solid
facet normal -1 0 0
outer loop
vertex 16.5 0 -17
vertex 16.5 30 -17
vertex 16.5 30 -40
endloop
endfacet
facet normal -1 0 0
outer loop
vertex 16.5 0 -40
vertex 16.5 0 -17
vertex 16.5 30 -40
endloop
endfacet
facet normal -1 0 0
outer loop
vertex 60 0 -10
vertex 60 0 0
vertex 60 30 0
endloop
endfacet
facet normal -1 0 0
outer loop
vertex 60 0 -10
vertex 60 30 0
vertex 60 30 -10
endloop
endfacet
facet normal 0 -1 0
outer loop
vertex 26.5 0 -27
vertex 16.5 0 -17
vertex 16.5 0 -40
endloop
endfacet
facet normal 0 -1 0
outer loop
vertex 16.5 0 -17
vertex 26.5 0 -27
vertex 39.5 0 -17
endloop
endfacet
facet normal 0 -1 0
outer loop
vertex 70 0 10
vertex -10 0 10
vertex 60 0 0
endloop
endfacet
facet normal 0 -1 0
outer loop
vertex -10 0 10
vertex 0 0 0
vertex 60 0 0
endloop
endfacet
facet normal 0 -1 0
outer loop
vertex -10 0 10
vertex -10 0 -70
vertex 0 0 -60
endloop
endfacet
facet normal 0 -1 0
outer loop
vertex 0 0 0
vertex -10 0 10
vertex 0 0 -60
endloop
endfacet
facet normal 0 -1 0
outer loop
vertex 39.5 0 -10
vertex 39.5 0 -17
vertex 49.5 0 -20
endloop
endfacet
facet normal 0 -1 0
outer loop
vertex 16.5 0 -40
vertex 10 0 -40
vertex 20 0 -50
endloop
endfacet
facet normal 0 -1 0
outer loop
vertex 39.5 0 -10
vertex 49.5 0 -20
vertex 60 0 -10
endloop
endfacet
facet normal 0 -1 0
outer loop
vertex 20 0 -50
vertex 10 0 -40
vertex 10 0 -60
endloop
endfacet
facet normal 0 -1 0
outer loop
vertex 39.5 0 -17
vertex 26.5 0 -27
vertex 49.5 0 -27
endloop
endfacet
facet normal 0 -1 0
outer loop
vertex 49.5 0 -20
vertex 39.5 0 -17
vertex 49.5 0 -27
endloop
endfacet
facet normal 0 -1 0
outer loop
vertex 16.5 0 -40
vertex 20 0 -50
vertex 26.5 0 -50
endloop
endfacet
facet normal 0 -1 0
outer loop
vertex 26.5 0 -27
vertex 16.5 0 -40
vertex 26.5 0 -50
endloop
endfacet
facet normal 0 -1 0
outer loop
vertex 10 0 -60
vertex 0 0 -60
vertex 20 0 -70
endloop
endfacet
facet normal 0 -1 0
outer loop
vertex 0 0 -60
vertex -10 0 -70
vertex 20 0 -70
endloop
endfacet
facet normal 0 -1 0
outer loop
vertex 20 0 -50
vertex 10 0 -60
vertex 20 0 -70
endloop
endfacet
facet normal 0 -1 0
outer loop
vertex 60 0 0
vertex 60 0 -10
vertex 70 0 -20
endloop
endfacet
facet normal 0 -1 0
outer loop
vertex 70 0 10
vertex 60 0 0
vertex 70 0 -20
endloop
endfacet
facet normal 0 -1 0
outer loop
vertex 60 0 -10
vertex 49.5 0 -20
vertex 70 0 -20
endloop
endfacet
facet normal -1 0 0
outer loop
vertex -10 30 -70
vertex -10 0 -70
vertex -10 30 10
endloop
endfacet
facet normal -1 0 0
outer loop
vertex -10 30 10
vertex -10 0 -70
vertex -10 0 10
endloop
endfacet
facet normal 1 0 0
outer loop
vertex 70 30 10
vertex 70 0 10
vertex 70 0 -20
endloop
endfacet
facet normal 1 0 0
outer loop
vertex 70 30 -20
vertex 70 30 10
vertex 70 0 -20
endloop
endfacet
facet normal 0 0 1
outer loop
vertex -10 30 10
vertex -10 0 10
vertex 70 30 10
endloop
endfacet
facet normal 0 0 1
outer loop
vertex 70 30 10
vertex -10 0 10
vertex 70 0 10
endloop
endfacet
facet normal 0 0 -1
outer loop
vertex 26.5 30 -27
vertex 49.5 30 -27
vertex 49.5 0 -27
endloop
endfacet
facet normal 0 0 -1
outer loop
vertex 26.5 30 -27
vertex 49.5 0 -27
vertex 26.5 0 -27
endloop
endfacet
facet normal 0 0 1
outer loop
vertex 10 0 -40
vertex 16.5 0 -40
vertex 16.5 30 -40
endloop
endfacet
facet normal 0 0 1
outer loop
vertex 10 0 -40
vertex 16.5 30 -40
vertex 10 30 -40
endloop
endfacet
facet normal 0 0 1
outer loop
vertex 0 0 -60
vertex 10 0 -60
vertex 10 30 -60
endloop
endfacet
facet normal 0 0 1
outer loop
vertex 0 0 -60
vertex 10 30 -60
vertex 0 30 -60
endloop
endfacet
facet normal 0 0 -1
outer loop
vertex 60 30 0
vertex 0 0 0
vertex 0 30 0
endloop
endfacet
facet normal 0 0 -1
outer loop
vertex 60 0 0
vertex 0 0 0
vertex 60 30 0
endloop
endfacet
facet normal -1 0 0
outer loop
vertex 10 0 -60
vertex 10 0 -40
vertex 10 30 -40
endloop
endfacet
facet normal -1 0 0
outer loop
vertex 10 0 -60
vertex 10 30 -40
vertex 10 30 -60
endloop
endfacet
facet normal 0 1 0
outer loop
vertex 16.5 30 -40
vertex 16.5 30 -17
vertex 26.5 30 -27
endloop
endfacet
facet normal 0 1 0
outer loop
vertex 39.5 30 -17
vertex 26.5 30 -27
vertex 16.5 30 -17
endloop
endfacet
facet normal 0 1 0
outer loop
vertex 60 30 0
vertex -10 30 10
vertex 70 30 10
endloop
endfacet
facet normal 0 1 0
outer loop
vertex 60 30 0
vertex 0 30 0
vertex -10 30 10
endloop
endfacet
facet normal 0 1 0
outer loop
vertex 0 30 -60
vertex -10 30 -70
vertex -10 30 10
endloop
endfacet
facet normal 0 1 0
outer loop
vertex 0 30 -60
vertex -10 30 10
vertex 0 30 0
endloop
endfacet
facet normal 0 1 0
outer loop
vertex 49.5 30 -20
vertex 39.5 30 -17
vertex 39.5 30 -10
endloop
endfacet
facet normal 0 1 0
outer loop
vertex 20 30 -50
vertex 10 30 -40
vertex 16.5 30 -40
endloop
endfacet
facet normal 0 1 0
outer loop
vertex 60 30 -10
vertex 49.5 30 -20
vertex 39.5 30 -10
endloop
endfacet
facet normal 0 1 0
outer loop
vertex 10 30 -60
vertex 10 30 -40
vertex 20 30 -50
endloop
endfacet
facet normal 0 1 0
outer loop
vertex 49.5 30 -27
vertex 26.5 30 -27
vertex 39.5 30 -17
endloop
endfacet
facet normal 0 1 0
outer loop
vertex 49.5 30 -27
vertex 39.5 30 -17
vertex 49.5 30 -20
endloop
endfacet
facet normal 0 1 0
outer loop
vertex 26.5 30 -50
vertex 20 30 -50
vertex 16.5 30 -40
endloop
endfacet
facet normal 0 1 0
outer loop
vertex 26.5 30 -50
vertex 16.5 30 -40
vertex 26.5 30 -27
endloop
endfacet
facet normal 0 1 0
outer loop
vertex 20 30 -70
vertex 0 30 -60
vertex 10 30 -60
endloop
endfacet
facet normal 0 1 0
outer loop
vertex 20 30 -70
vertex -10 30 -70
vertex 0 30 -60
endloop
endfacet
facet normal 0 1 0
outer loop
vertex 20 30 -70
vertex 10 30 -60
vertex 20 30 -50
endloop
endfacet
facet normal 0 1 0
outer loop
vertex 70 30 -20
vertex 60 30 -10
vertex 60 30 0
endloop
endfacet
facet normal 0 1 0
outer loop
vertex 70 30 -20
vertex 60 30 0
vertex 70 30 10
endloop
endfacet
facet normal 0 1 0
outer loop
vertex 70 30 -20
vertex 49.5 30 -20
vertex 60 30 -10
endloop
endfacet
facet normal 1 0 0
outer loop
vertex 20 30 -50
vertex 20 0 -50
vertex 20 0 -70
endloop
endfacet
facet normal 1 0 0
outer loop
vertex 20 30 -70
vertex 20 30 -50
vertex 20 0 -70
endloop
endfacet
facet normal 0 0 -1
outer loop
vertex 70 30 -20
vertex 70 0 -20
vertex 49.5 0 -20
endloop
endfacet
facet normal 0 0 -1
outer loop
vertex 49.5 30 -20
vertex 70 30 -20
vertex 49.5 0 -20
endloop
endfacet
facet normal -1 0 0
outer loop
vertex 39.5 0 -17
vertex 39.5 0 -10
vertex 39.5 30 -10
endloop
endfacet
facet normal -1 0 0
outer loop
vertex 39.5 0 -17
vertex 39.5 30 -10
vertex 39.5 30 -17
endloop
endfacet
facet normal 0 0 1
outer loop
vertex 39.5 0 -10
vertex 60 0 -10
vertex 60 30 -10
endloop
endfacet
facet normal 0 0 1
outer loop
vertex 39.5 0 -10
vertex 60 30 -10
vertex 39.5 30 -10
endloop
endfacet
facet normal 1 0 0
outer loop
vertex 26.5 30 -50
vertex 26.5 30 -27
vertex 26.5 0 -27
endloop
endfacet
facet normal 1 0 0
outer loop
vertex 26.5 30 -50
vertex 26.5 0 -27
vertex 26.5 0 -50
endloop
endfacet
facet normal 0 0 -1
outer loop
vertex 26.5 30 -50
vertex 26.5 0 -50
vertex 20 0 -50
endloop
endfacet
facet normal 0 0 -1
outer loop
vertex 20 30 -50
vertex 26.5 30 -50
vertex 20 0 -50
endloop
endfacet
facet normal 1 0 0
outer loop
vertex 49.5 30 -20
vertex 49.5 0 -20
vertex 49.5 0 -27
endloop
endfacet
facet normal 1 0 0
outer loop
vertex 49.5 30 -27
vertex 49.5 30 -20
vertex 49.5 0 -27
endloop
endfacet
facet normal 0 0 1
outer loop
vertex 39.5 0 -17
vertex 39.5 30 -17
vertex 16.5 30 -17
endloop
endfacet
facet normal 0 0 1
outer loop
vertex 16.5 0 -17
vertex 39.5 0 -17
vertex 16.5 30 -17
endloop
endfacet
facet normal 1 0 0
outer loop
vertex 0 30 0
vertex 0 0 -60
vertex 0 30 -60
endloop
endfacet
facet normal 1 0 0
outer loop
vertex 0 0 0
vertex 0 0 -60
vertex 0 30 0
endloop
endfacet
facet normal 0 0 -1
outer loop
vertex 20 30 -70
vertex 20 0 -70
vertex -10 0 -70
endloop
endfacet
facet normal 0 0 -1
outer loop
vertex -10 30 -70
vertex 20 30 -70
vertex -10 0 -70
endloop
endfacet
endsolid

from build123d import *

# Parameters (mm, degrees)
EXTRUDE_1_DEPTH = 30


with BuildPart() as part:
    # 草图1 → 拉伸-薄壁1 (new body)
    with BuildSketch(Plane(origin=(0, 0, 0), x_dir=(1, 0, 0), z_dir=(0, 1, 0))):
        Polygon((-10, -10), (70, -10), (70, 20), (49.5, 20), (49.5, 27), (26.5, 27), (26.5, 50), (20, 50), (20, 70), (-10, 70), align=None)
        Polygon((0, 0), (60, 0), (60, 10), (39.5, 10), (39.5, 17), (16.5, 17), (16.5, 40), (10, 40), (10, 60), (0, 60), align=None, mode=Mode.SUBTRACT)
    extrude(amount=EXTRUDE_1_DEPTH)


solid = part.part
